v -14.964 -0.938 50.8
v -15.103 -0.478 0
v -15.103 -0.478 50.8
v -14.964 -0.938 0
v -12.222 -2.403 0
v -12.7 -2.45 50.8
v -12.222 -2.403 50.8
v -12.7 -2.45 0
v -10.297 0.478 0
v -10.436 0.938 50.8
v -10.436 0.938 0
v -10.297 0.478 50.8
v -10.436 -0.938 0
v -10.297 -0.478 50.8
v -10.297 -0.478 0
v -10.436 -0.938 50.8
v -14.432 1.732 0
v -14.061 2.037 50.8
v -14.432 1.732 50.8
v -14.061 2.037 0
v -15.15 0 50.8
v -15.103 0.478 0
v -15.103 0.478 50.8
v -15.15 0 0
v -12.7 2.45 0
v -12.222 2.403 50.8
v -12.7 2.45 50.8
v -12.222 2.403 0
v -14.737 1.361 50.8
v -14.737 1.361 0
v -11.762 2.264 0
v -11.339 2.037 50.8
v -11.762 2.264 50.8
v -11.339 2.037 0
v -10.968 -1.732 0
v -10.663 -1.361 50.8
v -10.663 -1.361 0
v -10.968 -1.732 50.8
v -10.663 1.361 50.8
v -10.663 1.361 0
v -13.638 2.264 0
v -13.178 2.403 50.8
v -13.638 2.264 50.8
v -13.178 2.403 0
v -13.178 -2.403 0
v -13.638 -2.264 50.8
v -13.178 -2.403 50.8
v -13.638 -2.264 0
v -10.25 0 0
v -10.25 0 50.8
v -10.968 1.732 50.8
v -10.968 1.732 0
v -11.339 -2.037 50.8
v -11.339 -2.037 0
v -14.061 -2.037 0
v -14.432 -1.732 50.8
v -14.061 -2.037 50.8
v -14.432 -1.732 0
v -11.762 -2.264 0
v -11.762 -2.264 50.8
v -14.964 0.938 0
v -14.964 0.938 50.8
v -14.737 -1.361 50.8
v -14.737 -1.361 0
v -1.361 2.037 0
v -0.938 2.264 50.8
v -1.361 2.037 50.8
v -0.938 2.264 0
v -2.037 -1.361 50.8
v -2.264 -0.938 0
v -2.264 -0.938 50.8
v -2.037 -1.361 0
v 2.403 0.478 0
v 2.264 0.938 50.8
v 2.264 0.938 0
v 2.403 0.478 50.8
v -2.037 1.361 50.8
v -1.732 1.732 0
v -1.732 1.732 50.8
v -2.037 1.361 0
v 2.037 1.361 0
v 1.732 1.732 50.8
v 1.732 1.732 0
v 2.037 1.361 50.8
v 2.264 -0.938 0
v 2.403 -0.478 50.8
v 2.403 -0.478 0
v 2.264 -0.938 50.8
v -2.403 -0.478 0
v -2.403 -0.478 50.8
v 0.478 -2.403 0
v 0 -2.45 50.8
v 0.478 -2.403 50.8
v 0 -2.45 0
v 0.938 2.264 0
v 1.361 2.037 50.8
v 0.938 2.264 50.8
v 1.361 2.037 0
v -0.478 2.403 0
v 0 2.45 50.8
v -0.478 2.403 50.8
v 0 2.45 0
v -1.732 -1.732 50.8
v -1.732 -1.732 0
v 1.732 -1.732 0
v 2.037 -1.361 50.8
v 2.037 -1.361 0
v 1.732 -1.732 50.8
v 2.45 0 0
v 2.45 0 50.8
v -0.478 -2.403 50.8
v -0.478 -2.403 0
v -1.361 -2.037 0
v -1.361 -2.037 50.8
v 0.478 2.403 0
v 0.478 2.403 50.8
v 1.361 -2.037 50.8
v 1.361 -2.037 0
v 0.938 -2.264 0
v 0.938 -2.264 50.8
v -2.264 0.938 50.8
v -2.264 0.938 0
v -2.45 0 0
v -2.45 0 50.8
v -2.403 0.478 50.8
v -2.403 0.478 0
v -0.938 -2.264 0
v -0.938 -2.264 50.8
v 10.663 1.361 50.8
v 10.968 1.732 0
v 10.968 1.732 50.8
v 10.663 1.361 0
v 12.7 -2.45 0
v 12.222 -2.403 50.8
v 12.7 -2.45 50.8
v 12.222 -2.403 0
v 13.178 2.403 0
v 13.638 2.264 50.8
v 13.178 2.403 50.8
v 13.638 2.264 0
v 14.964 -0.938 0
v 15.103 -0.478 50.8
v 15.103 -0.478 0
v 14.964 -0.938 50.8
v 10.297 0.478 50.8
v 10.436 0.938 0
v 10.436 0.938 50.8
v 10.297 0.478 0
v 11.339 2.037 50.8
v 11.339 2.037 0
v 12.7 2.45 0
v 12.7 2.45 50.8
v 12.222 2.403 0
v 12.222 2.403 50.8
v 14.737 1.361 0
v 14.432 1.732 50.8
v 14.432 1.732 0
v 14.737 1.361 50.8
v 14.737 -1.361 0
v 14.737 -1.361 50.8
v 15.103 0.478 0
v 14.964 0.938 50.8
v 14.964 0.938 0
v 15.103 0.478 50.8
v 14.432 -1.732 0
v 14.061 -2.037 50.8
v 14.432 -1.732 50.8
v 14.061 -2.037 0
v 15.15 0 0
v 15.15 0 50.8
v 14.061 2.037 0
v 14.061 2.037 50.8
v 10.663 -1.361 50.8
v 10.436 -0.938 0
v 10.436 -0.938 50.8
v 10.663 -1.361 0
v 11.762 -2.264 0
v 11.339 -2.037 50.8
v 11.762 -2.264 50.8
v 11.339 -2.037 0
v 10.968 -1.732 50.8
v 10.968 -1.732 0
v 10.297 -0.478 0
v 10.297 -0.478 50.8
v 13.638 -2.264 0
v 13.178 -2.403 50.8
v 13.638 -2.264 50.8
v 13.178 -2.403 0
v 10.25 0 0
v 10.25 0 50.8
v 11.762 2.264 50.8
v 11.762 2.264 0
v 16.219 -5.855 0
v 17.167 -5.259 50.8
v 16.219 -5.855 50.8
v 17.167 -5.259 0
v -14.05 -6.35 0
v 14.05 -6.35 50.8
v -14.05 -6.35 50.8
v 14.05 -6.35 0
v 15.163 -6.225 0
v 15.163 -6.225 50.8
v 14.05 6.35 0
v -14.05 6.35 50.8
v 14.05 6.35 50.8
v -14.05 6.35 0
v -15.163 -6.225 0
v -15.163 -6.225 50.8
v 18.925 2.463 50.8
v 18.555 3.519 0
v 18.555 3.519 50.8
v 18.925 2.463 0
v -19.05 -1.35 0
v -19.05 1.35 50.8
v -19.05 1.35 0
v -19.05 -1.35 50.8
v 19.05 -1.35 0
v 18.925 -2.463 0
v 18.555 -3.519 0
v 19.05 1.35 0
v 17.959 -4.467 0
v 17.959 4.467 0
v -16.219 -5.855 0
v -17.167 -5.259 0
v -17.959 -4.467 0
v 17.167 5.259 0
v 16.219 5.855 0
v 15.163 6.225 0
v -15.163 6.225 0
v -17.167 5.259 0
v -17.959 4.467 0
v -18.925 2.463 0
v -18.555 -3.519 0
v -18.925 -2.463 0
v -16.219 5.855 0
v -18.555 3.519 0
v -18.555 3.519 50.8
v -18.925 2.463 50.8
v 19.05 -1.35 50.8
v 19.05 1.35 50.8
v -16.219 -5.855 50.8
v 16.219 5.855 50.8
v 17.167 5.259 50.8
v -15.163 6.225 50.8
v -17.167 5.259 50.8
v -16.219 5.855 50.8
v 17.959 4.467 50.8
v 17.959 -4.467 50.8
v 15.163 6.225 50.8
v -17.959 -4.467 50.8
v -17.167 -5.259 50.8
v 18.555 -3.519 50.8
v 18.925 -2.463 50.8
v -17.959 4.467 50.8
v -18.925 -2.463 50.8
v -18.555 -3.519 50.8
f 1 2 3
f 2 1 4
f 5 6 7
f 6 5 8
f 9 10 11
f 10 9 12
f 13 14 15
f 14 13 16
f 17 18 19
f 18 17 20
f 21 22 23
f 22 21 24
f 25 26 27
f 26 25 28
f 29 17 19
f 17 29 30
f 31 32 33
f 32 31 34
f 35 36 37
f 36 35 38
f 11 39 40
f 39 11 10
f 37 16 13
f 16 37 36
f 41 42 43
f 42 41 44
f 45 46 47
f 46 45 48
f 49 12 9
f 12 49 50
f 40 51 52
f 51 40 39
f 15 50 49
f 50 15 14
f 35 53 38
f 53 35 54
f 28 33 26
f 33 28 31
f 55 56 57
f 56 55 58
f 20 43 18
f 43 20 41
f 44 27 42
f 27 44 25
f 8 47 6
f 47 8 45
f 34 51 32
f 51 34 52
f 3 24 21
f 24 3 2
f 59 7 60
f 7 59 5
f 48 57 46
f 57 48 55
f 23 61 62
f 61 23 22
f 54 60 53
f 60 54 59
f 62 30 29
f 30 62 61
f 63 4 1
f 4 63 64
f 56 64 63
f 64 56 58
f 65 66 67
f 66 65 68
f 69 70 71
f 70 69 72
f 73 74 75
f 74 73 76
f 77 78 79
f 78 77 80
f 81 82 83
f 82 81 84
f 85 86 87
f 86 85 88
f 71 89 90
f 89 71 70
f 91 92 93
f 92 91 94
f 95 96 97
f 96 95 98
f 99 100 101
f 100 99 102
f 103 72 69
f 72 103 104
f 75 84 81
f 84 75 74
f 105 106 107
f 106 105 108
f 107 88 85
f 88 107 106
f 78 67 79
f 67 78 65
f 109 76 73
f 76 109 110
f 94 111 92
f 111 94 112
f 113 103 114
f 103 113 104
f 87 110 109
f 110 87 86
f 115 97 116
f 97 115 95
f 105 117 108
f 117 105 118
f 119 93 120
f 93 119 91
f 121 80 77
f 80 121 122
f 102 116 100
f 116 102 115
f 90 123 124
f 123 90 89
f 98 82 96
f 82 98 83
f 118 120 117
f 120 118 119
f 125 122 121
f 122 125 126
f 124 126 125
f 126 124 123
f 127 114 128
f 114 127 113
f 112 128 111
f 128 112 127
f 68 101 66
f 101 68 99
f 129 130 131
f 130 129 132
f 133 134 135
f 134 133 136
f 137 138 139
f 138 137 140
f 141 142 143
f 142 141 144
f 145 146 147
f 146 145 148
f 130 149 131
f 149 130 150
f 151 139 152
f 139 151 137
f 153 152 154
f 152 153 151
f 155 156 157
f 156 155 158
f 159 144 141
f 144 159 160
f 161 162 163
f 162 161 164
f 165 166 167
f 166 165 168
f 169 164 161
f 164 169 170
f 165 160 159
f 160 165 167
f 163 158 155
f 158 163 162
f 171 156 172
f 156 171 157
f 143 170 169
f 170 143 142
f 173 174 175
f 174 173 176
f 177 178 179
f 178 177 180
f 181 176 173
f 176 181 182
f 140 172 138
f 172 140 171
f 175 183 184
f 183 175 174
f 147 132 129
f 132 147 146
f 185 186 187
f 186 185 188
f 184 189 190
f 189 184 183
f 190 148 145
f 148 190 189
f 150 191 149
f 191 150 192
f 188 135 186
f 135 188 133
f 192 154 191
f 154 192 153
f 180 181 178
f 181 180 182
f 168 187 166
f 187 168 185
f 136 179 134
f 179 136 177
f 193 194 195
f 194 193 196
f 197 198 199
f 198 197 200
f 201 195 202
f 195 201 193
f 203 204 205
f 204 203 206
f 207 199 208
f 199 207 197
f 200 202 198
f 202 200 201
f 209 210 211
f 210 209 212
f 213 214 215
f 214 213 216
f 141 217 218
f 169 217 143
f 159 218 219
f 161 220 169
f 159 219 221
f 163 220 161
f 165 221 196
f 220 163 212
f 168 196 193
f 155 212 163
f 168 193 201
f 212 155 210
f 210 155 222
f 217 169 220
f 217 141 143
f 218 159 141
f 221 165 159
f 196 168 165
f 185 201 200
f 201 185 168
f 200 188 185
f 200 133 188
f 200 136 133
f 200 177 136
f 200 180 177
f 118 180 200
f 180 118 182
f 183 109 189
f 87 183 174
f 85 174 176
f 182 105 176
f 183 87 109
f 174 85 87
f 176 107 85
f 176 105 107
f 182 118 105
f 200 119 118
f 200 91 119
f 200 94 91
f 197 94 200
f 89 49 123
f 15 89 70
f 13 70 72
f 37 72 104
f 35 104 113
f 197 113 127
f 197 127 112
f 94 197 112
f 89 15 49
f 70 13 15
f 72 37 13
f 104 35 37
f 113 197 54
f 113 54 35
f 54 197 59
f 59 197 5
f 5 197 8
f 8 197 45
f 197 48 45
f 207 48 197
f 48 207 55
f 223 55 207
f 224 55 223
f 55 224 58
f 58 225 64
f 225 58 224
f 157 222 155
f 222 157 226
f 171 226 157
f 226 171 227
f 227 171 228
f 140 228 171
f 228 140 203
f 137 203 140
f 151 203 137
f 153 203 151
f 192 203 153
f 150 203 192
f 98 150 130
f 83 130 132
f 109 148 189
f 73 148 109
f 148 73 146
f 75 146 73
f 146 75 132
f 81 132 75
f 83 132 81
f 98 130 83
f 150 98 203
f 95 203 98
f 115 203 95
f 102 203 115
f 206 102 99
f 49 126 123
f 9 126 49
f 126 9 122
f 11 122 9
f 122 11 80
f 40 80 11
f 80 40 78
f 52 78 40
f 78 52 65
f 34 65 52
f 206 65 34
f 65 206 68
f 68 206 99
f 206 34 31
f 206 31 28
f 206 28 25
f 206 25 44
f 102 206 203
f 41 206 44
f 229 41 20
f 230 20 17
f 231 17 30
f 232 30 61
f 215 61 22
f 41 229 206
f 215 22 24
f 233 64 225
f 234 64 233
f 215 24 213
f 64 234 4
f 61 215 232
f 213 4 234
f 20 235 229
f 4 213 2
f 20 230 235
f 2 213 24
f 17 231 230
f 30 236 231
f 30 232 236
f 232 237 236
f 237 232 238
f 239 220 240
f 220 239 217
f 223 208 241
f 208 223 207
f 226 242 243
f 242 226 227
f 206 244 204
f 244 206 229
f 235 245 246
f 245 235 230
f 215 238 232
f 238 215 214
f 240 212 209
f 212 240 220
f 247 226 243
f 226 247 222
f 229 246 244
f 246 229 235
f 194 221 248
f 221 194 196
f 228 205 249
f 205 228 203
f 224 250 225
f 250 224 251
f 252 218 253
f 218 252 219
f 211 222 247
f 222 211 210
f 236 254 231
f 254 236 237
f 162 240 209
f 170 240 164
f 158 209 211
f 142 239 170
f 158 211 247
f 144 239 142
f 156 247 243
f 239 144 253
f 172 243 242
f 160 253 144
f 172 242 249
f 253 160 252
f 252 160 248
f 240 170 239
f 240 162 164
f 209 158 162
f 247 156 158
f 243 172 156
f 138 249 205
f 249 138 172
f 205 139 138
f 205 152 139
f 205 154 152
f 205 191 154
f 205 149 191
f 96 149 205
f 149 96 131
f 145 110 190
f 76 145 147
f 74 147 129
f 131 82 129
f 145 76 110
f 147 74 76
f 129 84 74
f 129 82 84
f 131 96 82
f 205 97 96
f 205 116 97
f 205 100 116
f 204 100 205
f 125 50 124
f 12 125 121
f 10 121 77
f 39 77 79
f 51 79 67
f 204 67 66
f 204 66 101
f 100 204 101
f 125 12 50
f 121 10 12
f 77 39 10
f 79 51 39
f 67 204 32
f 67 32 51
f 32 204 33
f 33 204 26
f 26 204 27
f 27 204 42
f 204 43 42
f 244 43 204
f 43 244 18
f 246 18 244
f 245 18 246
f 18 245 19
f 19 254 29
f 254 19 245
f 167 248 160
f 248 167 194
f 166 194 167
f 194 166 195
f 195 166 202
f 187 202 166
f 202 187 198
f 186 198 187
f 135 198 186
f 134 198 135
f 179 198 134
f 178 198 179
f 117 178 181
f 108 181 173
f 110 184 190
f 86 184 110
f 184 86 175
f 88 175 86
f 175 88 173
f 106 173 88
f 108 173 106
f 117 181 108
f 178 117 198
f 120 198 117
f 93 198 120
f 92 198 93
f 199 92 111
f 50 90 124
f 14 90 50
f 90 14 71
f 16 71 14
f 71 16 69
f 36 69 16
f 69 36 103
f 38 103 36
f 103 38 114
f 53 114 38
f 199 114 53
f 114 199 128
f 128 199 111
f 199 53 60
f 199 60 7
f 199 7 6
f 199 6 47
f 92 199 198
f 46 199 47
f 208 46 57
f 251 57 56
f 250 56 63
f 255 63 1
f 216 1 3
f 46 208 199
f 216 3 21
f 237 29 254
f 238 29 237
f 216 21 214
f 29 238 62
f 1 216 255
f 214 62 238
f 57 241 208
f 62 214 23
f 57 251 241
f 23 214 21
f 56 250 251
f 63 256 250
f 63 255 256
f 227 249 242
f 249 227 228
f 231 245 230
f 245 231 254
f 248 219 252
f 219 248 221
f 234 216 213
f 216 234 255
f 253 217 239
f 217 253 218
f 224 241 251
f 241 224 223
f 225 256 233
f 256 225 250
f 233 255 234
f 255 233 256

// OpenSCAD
// Midblock2.1
// 
// New midblocks, for different purposes!
// 
// v2.1:
// - Add `right_side_offset` parameter
// - Add `straight-4.5mm` option for `hole_style`
// - Base at z=0 instead of center

height = "2inch";
size = ["3atom","1atom"];
concave_corner_radius = "0mm";
hole_style = "straight-4.5mm"; // ["#6-32-UNC", "straight-4.5mm", "straight-5mm"]
right_side_offset = "0mm";
$fn = 32;

module __midblock2__end_params() { }

use <../lib/TOGUnits1.scad>
use <../lib/TOGMod1.scad>
use <../lib/TOGMod1Constructors.scad>
use <../lib/TOGPolyhedronLib1.scad>
use <../lib/TOGThreads2.scad>
use <../lib/TOGPath1.scad>

right_side_offset_mm = togunits1_to_mm(right_side_offset);
size_mm = [for(d=size) togunits1_to_mm(d)];
height_mm = togunits1_to_mm(height);
concave_corner_radius_mm = togunits1_to_mm(concave_corner_radius);
atom = 12.7;
$togthreads2_polyhedron_algorithm = "v3";

hole = ["render",togthreads2_make_threads(
	togthreads2_simple_zparams([[0,1], [height_mm,1]], 1),
	hole_style,
	r_offset = 0.2
)];

block_hull_x0 = -size_mm[0]/2;
block_hull_x1 =  size_mm[0]/2 + right_side_offset_mm;
block_hull_y0 = -size_mm[1]/2;
block_hull_y1 =  size_mm[1]/2;

block_hull =
	togmod1_linear_extrude_z([0, height_mm], ["difference",
		togpath1_rath_to_polygon(let(cops=[["round",5]]) ["togpath1-rath",
			["togpath1-rathnode", [block_hull_x1, block_hull_y0], each cops],
			["togpath1-rathnode", [block_hull_x1, block_hull_y1], each cops],
			["togpath1-rathnode", [block_hull_x0, block_hull_y1], each cops],
			["togpath1-rathnode", [block_hull_x0, block_hull_y0], each cops],
		]),
		
		["translate", [size_mm[0]/2, size_mm[1]/2],
			togmod1_make_circle(r=concave_corner_radius_mm)]
	]);

size_atoms = [for(d=size) round(togunits1_decode(d, "1atom"))];

block = ["difference",
	block_hull,
	
	for( xm=[-size_atoms[0]/2+0.5 : 1 : size_atoms[0]/2-0.4] )
	for( ym=[-size_atoms[1]/2+0.5 : 1 : size_atoms[1]/2-0.4] )
	let( x=xm*atom, y=ym*atom )
	if( x > block_hull_x0+4 && x < block_hull_x1-4 )
	["translate", [x, y], hole]
];

togmod1_domodule(block);
